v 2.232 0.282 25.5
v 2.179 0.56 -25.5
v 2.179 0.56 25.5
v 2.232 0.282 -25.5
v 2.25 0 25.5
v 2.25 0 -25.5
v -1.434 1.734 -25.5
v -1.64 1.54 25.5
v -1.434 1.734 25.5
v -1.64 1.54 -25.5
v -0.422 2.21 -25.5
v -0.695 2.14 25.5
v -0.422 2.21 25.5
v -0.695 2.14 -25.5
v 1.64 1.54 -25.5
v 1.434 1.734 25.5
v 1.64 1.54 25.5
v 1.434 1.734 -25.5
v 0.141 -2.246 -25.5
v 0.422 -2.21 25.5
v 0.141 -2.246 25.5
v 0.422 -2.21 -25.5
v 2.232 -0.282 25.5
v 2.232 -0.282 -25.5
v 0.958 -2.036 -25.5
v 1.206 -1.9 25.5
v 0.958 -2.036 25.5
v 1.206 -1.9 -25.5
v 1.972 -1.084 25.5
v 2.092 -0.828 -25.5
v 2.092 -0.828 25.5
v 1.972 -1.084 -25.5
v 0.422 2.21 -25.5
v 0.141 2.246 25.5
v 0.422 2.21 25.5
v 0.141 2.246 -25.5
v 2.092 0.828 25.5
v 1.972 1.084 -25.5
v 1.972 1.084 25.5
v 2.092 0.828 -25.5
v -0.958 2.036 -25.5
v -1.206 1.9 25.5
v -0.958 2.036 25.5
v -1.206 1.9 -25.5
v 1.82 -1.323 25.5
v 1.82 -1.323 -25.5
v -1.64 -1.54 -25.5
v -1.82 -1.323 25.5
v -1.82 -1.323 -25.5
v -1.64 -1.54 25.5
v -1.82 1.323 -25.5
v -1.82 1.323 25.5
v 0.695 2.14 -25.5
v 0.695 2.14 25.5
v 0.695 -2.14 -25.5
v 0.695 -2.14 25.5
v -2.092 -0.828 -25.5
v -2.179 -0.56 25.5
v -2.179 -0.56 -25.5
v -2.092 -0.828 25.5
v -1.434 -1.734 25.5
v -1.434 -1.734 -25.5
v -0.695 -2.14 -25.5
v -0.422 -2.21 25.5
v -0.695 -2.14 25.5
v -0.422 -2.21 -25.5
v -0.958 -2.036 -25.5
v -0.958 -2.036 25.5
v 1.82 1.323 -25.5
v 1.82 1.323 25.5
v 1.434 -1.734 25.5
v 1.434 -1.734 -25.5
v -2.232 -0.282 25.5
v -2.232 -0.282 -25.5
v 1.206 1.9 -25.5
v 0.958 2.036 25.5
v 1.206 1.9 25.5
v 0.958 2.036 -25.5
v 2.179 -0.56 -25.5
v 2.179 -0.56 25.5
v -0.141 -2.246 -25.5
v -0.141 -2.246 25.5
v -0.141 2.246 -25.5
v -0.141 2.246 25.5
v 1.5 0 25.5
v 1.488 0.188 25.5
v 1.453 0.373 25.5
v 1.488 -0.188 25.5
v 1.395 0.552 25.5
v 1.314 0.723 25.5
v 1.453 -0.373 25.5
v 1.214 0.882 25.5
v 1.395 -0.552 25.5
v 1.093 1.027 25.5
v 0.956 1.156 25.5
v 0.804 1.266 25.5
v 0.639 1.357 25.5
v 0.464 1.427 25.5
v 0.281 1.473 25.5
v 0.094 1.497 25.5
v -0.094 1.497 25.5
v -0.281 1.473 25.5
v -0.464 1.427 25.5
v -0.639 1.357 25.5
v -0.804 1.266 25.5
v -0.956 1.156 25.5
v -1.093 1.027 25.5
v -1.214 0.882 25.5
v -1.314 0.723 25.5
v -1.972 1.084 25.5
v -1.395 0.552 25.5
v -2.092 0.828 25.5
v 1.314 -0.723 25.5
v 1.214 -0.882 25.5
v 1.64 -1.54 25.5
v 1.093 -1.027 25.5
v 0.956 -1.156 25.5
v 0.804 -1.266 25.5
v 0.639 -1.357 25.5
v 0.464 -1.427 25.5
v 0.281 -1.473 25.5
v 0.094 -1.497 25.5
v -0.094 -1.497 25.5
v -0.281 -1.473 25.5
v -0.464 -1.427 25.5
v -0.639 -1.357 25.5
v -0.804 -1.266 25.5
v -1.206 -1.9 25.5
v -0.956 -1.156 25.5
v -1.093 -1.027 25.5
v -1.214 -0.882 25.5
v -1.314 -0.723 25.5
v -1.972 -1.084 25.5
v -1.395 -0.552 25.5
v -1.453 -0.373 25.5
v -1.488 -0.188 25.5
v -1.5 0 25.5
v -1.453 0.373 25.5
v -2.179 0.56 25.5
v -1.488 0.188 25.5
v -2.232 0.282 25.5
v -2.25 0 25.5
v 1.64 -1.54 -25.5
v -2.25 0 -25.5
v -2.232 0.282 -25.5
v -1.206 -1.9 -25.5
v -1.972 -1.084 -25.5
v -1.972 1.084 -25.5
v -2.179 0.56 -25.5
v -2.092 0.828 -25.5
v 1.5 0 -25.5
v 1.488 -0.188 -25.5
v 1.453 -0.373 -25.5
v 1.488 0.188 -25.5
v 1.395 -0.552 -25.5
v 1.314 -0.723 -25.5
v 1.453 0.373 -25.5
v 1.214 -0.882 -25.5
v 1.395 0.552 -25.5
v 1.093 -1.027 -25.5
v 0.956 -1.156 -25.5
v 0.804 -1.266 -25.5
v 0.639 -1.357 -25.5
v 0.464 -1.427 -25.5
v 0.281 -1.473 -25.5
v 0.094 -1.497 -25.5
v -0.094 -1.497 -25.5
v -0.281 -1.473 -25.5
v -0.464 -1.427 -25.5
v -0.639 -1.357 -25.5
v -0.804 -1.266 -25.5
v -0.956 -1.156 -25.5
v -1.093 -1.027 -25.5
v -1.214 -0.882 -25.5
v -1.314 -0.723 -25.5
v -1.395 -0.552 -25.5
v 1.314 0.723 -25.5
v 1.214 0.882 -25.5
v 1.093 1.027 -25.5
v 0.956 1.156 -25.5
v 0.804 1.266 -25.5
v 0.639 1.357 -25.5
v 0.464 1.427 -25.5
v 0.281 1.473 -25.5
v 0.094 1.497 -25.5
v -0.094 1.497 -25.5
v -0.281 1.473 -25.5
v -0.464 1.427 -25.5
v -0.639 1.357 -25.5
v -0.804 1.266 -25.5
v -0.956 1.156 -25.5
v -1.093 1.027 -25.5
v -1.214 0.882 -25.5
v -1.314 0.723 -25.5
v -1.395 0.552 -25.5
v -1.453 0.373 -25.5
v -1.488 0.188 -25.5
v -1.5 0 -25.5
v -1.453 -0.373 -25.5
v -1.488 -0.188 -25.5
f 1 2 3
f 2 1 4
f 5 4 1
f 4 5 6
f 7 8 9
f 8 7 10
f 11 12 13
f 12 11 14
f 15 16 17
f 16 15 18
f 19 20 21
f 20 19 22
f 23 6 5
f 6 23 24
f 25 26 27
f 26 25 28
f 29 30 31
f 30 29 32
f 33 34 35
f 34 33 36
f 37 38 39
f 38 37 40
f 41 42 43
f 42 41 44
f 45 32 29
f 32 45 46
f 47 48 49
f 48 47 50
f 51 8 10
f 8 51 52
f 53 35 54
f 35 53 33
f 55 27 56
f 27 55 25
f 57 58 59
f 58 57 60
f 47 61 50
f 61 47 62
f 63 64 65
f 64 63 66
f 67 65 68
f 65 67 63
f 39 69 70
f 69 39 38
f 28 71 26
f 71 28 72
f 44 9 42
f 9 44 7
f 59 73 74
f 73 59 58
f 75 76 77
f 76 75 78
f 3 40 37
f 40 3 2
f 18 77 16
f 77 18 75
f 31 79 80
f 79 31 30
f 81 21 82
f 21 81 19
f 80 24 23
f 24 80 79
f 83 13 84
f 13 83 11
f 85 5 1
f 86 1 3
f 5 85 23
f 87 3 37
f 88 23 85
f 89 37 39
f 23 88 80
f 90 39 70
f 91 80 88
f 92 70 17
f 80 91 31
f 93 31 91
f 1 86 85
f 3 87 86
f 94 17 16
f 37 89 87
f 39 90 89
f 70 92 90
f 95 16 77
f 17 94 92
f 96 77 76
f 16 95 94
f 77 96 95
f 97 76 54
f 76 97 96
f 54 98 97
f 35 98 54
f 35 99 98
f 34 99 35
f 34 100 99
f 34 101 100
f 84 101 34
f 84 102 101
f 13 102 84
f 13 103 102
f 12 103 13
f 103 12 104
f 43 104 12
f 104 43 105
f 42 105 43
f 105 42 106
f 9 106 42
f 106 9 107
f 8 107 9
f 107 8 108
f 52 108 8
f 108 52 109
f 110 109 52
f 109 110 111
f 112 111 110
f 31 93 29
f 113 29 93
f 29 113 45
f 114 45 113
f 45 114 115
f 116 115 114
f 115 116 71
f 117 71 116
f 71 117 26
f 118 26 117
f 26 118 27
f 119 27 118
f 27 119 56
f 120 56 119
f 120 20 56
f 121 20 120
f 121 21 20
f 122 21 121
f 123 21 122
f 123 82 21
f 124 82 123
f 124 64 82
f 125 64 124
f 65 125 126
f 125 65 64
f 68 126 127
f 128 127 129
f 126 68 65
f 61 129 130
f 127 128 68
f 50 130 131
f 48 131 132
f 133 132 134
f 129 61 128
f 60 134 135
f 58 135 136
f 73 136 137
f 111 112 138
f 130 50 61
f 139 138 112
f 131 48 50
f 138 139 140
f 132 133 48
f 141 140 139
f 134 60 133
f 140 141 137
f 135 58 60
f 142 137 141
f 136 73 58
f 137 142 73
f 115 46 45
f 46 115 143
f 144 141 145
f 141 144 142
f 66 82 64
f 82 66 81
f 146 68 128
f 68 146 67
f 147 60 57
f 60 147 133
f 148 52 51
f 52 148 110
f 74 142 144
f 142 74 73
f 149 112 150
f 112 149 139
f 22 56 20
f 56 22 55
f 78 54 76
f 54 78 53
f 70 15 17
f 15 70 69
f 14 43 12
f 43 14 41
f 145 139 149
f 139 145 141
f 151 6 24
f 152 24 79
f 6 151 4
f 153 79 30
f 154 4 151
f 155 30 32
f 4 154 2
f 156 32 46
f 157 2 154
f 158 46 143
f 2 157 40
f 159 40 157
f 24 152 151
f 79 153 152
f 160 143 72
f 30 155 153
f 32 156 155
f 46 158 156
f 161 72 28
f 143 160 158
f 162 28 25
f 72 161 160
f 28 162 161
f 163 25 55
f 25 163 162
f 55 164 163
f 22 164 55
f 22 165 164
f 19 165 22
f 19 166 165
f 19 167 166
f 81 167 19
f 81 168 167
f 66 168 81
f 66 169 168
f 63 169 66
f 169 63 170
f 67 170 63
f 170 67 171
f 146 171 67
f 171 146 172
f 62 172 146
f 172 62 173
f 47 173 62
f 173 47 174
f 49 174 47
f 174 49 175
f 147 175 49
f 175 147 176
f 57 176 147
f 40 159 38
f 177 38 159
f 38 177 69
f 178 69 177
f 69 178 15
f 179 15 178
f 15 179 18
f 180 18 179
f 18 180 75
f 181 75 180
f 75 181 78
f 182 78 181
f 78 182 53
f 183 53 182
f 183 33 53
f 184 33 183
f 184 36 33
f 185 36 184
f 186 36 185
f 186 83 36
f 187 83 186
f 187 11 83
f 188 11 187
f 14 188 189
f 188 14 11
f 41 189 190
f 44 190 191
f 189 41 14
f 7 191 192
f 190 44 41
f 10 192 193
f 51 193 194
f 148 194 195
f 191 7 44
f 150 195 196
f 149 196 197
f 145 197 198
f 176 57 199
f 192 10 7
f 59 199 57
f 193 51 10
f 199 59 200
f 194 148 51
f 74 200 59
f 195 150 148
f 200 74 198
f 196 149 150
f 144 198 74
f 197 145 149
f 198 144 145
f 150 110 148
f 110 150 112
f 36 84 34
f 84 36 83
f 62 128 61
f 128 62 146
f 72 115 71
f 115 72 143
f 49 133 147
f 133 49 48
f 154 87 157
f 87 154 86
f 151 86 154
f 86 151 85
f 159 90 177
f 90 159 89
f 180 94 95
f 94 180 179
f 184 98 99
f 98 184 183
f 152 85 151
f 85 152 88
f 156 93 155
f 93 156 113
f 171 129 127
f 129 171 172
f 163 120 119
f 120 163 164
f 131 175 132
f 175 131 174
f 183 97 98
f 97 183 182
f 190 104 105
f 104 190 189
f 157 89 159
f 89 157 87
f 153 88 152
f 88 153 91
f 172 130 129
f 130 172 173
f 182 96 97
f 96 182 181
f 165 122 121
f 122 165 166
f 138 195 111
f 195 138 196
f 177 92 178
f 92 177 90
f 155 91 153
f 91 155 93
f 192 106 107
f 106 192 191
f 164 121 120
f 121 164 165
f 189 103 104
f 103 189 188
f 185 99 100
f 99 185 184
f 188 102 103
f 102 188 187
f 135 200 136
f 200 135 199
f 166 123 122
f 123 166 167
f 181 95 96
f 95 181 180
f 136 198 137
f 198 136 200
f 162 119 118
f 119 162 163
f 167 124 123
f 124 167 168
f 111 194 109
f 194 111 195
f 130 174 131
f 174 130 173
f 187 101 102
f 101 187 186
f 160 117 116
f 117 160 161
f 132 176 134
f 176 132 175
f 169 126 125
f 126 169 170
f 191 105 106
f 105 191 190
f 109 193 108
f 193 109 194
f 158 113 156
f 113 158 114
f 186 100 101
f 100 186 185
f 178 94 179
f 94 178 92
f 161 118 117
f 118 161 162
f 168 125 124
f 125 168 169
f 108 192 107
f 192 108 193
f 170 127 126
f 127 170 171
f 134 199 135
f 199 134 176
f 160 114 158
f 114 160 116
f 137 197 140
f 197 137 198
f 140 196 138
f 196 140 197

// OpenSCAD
$fn = 50;


difference() {
	union() {
		translate(v = [0, 0, -25.5000000000]) {
			cylinder(h = 51, r = 2.2500000000);
		}
	}
	union() {
		translate(v = [0, 0, -100.0000000000]) {
			cylinder(h = 200, r = 1.5000000000);
		}
	}
}
